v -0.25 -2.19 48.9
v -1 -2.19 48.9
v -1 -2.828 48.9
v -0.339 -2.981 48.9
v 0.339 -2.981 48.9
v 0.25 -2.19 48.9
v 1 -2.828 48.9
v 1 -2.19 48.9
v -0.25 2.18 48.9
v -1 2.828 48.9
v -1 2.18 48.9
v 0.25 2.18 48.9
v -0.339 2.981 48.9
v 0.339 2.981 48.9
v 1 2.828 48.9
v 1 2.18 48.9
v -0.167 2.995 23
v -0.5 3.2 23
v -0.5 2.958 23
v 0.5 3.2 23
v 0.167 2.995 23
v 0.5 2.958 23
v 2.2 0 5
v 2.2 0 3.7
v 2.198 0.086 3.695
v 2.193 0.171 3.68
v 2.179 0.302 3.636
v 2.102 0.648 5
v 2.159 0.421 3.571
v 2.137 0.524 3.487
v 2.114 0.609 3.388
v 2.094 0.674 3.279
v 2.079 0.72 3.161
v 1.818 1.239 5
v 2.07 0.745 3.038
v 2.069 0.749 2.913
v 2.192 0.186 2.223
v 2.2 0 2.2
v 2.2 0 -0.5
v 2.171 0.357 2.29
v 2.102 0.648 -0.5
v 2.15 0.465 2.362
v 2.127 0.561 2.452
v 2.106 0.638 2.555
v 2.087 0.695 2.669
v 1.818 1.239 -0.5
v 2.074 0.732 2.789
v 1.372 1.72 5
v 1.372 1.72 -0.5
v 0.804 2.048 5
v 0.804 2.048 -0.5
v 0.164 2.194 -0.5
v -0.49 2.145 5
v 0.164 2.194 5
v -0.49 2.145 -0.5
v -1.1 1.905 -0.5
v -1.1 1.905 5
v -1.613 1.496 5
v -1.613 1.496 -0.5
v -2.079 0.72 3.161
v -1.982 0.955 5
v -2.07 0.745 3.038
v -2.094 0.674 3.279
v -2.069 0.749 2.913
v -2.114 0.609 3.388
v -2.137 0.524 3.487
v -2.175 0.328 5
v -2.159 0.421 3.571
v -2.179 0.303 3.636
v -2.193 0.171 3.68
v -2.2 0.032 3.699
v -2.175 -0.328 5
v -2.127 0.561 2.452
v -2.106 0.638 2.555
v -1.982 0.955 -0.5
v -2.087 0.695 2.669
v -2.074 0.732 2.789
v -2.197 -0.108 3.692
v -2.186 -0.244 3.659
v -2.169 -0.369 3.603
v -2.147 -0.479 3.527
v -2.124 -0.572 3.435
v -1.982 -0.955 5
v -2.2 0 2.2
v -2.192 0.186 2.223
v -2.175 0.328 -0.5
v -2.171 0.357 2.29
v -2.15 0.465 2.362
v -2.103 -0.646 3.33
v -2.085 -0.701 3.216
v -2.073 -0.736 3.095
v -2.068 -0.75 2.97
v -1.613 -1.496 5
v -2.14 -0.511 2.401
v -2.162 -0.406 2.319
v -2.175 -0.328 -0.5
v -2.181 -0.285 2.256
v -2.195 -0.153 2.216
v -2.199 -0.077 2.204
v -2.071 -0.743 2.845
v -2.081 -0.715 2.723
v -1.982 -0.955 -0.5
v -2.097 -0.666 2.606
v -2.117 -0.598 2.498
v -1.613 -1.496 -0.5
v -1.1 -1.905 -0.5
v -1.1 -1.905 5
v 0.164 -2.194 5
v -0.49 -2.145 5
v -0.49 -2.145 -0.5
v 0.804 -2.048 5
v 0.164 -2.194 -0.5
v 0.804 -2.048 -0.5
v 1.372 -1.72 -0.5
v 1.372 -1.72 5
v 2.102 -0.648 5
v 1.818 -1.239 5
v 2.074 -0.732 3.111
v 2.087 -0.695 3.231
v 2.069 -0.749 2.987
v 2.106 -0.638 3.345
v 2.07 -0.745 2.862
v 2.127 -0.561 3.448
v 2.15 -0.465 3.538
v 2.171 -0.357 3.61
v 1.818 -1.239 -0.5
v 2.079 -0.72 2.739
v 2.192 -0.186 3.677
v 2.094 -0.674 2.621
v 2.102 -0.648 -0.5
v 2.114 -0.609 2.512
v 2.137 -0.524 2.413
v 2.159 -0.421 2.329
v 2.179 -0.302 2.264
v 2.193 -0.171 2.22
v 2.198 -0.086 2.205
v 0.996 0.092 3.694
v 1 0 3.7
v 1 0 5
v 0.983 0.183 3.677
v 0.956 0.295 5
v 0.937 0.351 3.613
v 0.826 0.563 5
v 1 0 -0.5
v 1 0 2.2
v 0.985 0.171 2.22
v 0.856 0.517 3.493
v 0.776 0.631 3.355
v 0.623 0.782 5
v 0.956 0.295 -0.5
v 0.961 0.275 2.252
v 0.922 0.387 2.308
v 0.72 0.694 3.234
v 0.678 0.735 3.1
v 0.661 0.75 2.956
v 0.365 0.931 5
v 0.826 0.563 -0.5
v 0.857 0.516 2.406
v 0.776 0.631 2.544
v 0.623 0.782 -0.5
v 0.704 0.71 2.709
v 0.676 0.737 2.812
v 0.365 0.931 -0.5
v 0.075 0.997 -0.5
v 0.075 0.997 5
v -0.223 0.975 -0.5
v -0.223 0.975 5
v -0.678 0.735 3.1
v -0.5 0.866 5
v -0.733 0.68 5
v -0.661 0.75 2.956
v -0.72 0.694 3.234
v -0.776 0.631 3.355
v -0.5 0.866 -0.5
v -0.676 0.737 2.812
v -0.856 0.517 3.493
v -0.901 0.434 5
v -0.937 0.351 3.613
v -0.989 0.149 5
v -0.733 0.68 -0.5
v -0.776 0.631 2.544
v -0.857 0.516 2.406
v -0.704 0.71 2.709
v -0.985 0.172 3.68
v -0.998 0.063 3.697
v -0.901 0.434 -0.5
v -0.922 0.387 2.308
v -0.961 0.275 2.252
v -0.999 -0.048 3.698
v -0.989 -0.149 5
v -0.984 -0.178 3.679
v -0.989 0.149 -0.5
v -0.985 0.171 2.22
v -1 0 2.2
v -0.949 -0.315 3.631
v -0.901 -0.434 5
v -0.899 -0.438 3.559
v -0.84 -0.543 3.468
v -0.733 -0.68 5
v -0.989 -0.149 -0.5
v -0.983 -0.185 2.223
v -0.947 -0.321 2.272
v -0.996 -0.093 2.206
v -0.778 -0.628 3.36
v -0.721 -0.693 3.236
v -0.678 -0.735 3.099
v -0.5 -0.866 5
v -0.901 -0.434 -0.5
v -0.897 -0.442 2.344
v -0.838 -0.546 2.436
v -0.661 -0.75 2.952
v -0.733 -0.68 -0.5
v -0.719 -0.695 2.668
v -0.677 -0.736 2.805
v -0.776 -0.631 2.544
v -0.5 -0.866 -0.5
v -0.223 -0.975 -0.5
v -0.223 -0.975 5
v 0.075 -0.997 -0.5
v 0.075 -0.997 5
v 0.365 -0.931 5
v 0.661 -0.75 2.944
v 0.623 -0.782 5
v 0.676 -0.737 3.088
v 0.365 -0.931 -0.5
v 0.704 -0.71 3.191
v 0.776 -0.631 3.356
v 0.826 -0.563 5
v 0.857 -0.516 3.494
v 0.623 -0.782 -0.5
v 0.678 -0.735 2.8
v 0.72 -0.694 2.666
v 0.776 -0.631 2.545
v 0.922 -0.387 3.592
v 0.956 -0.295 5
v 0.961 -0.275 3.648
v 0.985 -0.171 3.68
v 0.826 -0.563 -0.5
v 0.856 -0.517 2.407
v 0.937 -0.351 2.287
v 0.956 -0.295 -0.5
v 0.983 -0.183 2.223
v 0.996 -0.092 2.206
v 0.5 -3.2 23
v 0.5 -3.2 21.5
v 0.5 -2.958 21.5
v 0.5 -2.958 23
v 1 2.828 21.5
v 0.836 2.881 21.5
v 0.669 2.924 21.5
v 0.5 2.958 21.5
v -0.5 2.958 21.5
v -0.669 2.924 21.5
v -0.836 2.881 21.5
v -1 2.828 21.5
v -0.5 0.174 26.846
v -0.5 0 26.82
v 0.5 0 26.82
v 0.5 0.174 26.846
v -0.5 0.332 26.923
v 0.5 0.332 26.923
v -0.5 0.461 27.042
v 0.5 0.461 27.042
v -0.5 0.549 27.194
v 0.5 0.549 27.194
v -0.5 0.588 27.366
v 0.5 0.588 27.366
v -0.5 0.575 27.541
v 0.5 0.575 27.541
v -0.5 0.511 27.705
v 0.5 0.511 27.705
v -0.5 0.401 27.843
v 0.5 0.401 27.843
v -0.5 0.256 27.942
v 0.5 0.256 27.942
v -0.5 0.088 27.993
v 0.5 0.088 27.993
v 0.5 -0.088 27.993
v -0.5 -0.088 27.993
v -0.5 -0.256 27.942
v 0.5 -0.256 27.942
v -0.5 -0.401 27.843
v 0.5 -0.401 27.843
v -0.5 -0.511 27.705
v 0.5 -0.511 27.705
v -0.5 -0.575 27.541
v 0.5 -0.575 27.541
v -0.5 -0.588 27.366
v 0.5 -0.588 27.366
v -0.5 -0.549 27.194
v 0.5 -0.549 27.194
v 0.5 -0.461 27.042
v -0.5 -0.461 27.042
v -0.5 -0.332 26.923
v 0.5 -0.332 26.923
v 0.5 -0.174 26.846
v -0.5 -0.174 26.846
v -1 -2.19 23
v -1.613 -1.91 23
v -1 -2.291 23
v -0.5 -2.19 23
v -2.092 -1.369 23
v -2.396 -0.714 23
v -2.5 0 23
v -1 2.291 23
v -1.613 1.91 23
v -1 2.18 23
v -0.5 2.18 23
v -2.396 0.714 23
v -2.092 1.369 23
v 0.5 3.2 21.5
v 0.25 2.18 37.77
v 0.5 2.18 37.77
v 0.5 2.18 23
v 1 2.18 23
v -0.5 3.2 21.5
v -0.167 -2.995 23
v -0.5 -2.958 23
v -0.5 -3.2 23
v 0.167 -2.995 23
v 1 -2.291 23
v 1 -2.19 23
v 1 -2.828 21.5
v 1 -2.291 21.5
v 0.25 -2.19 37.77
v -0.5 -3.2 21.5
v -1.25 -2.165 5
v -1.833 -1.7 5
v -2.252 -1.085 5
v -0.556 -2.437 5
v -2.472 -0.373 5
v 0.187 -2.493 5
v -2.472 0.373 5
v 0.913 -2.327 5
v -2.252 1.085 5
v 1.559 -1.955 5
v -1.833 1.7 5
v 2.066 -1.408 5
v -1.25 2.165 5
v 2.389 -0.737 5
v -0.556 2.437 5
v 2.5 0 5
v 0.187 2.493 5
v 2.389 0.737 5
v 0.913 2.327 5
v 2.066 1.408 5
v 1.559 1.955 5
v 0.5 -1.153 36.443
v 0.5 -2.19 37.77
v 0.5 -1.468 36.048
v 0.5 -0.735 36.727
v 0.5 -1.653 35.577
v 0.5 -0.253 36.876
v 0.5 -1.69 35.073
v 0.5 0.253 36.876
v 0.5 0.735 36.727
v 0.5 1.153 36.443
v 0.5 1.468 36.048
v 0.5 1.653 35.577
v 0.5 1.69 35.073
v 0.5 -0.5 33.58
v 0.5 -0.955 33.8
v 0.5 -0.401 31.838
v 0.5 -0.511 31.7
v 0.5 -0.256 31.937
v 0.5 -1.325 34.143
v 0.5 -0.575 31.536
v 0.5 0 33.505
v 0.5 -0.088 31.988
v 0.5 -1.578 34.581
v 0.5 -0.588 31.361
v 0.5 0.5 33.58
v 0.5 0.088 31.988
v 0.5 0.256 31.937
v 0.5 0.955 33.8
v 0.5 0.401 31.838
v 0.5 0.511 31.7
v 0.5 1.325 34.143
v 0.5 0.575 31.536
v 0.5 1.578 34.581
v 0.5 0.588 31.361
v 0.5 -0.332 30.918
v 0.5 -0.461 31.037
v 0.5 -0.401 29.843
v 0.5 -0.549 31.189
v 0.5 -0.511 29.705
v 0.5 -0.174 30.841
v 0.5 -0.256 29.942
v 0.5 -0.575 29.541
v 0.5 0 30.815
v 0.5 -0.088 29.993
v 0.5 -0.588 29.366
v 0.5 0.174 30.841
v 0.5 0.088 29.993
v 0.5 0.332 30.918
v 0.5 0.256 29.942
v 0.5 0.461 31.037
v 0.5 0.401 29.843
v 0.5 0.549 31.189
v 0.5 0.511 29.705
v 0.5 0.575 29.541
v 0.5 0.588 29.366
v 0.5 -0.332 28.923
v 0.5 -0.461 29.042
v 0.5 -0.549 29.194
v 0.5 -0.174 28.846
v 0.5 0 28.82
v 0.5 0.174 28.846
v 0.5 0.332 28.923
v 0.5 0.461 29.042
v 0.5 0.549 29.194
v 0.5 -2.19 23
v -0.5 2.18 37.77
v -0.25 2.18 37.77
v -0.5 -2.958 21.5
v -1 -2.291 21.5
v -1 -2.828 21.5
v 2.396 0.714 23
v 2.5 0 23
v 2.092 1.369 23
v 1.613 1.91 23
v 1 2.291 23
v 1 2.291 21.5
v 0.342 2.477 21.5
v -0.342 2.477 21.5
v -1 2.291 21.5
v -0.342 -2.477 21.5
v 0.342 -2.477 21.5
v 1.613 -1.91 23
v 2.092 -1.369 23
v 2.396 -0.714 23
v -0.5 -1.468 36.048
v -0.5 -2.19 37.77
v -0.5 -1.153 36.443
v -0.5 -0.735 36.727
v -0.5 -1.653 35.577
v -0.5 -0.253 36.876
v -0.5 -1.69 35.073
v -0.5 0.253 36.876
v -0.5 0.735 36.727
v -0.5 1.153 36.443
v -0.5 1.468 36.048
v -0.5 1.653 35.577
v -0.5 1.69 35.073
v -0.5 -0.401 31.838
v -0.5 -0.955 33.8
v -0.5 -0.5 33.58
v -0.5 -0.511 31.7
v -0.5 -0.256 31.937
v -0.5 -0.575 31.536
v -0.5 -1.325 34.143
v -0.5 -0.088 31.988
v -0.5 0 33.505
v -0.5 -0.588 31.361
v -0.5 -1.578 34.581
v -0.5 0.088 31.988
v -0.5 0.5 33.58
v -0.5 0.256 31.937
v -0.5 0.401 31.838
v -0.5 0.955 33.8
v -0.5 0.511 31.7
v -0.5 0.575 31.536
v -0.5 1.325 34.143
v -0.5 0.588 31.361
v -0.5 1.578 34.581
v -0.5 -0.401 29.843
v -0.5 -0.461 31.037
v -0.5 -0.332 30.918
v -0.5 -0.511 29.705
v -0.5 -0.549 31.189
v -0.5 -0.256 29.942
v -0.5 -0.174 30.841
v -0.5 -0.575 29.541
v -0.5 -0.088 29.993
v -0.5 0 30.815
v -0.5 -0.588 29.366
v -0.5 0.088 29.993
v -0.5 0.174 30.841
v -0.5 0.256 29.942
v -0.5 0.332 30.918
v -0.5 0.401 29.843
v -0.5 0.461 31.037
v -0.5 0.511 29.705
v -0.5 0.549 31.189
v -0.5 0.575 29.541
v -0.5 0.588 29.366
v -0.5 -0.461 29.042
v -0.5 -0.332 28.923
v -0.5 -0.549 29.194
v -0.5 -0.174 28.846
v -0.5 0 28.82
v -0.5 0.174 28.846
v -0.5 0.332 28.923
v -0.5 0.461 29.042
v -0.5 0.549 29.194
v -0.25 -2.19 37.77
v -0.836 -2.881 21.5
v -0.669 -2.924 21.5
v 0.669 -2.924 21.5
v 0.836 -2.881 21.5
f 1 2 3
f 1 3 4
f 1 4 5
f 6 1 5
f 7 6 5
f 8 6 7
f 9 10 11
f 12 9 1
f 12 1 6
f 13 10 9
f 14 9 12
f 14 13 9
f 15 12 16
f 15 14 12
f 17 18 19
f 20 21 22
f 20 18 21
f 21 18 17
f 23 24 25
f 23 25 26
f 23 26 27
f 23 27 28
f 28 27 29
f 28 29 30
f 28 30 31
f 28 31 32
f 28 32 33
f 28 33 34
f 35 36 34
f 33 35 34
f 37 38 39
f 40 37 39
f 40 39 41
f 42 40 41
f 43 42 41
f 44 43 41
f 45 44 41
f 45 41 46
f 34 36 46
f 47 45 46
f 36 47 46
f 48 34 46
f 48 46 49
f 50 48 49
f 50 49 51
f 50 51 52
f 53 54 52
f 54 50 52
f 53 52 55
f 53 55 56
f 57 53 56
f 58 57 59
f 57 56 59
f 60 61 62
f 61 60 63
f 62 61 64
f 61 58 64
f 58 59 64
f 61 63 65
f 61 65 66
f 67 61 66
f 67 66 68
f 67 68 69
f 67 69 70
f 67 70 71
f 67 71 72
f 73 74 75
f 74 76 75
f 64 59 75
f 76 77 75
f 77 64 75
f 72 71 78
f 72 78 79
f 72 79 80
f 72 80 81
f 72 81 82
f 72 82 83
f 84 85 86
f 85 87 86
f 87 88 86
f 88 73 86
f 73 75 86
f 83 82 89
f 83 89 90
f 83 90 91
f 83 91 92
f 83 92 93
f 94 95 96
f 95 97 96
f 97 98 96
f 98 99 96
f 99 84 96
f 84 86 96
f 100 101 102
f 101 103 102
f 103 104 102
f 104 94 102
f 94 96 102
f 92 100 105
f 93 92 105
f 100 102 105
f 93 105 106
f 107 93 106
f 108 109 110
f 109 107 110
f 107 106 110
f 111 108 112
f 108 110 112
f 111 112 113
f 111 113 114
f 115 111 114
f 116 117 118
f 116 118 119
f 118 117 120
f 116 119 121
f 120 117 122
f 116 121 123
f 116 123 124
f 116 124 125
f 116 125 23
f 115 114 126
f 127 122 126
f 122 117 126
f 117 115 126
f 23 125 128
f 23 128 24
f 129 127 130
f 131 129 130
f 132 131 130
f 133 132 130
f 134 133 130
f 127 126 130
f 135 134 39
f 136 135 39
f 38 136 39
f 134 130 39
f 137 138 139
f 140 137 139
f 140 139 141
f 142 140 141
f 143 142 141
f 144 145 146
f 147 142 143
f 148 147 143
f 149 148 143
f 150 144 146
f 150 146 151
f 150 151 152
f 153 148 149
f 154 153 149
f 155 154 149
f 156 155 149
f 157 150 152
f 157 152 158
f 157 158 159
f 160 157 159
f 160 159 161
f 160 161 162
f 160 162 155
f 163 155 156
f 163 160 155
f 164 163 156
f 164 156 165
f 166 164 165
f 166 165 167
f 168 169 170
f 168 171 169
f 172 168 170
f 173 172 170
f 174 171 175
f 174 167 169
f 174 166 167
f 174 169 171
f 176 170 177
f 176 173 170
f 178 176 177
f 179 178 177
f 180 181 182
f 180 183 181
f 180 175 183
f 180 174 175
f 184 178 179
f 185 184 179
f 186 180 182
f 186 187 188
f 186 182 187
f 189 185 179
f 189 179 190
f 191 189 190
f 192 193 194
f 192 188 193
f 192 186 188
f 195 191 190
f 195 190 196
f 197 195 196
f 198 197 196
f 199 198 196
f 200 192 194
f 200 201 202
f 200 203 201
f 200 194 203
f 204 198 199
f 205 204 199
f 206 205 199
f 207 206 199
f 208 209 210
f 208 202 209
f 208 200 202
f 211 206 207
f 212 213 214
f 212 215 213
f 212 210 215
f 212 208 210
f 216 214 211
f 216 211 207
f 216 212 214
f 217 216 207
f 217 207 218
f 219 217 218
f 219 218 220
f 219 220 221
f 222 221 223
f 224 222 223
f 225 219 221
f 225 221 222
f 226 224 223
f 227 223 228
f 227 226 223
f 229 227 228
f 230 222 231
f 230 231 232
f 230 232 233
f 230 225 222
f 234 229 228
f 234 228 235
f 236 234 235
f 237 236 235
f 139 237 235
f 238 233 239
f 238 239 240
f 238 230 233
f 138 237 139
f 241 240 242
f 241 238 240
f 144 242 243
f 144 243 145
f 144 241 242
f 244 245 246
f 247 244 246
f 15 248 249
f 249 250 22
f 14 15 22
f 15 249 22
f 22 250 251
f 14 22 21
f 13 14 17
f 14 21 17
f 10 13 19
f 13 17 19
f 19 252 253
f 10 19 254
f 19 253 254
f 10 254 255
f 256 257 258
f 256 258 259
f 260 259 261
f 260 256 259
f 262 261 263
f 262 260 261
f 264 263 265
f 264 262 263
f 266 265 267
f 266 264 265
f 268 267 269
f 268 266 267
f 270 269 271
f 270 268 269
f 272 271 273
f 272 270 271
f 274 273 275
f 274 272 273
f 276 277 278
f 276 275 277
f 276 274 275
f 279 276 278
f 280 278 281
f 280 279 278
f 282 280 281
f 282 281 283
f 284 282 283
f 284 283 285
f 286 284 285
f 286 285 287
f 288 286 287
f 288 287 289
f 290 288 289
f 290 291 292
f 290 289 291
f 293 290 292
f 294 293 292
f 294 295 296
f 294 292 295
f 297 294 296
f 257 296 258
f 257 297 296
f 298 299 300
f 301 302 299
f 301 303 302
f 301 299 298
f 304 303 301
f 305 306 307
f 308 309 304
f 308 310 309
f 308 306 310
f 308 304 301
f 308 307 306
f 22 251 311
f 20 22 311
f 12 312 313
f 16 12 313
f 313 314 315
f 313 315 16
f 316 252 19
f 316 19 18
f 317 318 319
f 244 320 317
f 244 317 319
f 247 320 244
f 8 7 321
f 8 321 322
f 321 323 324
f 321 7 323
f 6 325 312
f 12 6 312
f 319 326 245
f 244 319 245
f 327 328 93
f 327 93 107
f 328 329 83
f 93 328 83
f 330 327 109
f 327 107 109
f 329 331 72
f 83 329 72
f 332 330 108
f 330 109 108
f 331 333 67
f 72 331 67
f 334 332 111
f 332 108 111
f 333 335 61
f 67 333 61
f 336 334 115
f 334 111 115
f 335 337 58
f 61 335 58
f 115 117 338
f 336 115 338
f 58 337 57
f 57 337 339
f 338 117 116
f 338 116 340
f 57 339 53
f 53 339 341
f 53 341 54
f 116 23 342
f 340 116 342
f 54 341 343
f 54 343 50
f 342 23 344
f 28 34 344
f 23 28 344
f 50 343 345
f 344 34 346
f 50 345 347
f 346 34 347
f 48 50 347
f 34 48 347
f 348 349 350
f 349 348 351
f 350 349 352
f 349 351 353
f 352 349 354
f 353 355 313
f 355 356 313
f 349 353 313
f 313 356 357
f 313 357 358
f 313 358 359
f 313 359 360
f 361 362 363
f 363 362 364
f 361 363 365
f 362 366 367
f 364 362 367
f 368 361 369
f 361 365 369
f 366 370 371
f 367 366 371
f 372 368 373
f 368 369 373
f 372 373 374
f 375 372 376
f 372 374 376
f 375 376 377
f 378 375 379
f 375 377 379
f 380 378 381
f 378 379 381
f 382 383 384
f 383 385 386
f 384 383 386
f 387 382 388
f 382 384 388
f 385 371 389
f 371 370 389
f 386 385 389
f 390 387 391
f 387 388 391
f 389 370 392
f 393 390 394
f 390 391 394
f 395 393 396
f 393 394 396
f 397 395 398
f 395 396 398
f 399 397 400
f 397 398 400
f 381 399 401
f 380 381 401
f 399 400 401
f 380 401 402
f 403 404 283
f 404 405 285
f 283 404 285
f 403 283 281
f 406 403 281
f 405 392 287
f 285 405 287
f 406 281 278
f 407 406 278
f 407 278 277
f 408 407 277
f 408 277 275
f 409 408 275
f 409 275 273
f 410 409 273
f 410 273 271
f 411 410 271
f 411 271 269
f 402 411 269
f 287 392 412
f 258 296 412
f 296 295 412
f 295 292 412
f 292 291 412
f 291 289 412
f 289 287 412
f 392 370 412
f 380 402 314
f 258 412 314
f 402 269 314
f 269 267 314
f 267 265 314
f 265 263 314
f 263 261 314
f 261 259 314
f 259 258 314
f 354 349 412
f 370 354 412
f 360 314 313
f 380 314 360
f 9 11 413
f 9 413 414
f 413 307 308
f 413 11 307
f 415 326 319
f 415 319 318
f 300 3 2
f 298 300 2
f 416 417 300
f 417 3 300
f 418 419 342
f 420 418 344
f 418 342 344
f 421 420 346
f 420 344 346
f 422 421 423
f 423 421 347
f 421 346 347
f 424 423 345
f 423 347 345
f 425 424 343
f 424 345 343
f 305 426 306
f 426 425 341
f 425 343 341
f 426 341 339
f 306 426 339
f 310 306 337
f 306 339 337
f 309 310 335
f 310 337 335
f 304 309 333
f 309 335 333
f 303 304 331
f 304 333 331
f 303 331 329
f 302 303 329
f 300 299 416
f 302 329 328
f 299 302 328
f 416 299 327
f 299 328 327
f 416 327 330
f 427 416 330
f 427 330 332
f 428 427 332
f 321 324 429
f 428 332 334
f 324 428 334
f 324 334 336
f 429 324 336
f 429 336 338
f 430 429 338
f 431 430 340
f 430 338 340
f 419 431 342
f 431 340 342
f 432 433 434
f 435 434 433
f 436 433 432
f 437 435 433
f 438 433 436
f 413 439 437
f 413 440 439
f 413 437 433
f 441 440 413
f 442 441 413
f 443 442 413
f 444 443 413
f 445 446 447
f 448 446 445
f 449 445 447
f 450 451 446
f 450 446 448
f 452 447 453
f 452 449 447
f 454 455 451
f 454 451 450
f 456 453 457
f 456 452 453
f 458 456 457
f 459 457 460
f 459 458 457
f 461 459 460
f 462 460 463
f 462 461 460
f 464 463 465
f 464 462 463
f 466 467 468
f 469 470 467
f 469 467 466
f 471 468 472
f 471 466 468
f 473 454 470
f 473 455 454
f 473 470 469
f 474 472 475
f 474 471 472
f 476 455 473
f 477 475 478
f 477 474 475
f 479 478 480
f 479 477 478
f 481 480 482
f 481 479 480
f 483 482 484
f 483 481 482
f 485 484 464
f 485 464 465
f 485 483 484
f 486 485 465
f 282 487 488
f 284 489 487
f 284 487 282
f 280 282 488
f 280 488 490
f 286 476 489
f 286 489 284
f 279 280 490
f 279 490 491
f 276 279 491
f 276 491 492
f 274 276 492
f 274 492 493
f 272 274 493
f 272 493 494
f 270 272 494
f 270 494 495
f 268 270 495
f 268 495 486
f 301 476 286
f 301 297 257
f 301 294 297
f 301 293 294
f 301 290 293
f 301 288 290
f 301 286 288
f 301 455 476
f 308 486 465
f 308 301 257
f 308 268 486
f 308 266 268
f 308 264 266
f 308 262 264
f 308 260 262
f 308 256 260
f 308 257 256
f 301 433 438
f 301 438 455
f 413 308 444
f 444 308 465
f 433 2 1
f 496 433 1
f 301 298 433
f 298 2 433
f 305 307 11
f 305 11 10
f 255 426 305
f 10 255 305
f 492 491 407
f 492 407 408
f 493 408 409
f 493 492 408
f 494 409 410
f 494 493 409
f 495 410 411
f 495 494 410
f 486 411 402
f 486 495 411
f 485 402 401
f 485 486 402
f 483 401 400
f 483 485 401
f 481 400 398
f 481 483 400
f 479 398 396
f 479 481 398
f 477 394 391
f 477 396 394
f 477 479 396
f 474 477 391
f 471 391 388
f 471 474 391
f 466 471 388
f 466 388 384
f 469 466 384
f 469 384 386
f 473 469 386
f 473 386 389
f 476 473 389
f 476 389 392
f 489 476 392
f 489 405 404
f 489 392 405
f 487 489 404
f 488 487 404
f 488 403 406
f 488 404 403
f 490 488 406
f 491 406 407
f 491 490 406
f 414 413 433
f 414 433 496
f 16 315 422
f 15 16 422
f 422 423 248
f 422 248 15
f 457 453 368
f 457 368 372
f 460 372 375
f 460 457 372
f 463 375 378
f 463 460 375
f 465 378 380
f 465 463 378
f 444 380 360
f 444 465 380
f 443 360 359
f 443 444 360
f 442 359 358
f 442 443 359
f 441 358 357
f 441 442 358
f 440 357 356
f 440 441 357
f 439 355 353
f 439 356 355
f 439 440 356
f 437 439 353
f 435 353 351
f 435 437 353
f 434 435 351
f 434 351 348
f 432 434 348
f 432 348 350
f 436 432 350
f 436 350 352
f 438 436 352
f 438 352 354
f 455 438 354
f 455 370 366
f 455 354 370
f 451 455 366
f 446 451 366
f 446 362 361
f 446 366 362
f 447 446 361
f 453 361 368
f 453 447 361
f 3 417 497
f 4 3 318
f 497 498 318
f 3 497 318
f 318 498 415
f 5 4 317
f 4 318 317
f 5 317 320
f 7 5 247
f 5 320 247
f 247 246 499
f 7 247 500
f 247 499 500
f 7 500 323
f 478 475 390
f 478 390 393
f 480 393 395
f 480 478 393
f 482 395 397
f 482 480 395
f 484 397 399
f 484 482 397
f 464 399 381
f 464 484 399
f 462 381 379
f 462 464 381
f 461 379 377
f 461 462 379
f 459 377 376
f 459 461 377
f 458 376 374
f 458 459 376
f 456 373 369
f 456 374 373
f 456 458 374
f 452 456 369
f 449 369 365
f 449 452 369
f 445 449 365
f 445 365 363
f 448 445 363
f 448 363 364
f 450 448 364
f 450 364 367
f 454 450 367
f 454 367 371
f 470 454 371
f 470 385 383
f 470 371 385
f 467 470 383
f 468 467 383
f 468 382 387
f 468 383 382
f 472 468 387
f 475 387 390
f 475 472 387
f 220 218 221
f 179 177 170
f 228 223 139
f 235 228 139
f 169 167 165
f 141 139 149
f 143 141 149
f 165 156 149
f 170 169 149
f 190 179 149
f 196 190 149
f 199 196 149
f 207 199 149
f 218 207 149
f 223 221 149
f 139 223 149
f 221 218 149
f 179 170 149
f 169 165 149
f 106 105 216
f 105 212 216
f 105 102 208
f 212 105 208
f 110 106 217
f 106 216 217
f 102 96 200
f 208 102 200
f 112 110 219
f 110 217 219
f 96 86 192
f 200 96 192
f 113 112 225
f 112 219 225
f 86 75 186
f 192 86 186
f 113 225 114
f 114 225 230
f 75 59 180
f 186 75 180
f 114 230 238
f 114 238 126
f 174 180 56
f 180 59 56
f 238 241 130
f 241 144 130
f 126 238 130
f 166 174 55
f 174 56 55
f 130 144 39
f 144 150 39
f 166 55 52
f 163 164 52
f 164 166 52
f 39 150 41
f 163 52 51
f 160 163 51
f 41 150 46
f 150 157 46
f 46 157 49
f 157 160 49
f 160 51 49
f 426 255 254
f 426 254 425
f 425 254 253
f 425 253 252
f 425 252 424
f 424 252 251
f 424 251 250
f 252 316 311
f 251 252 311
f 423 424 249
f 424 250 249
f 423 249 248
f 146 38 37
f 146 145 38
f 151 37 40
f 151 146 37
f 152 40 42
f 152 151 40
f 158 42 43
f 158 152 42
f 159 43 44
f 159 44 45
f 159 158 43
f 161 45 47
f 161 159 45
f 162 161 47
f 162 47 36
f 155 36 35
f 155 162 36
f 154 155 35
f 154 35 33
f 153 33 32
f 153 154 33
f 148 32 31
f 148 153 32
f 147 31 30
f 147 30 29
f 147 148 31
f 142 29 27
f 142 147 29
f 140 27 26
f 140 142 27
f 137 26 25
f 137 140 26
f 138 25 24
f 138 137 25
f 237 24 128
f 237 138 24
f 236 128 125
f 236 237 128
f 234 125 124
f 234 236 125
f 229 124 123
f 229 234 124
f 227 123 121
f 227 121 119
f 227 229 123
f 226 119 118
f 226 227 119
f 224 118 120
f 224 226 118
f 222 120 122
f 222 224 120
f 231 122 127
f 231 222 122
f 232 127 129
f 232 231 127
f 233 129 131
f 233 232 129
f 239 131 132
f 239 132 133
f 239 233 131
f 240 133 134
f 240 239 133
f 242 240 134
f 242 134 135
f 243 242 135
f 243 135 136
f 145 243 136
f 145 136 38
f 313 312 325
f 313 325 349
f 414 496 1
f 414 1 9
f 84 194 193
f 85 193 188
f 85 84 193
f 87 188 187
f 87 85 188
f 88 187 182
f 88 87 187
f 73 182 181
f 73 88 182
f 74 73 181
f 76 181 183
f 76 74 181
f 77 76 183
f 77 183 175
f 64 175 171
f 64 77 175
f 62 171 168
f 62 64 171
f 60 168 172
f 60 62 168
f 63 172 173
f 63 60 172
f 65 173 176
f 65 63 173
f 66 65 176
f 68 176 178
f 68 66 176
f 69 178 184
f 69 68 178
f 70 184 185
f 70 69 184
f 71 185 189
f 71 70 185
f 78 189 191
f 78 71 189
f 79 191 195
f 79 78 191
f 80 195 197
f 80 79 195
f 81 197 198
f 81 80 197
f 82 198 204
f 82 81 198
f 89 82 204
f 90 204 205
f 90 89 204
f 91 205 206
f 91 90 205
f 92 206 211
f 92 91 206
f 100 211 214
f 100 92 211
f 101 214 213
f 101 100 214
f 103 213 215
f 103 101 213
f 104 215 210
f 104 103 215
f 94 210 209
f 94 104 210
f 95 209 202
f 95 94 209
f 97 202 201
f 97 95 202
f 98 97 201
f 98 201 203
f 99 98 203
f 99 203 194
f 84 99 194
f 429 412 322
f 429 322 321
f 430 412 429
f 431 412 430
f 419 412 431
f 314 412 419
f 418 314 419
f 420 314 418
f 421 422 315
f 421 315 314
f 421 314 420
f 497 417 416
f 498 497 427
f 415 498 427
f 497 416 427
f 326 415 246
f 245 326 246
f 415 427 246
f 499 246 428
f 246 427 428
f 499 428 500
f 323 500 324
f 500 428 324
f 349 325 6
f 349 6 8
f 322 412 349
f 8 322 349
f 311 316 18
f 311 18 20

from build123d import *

# Parameters (mm, degrees)
BOX002_W          = 1
BOX002_H          = 6.4
BOX002_DEPTH      = 1.5
BOX006_W          = 10
BOX006_H          = 4.37
BOX006_DEPTH      = 12
BOX005_W          = 10
BOX005_H          = 4.37
BOX005_DEPTH      = 12
CYLINDER008_R     = 0.59
CYLINDER008_DEPTH = 50
CYLINDER009_R     = 0.59
CYLINDER009_DEPTH = 50
CYLINDER007_R     = 0.59
CYLINDER007_DEPTH = 50
BOX003_W          = 10
BOX003_H          = 4.37
BOX003_DEPTH      = 26
BOX004_W          = 10
BOX004_H          = 4.37
BOX004_DEPTH      = 26
BOX001_W          = 10
BOX001_H          = 5.5
BOX001_DEPTH      = 27
CYLINDER006_R     = 1.695
CYLINDER006_DEPTH = 20
CYLINDER003_R     = 1.1
CYLINDER003_DEPTH = 2
BOX_W             = 2
BOX_H             = 10
BOX_DEPTH         = 27.9
CYLINDER004_R     = 3
CYLINDER004_DEPTH = 27.4
CYLINDER005_R     = 1
CYLINDER005_DEPTH = 5.5
CYLINDER002_R     = 0.75
CYLINDER002_DEPTH = 6.2
CYLINDER001_R     = 2.5
CYLINDER001_DEPTH = 18
CYLINDER_R        = 2.2
CYLINDER_DEPTH    = 21.5


with BuildPart() as w_rfel002:
    # Box002 → Box002 (new body)
    with BuildSketch(Plane(origin=(-0.5, -3.2, 21.5), x_dir=(1, 0, 0), z_dir=(0, 0, 1))):
        with Locations((0.5, 3.2)):
            Rectangle(BOX002_W, BOX002_H)
    extrude(amount=BOX002_DEPTH)


with BuildPart() as w_rfel006:
    # Box006 → Box006 (new body)
    with BuildSketch(Plane(origin=(-10.25, -2.19, 36.77), x_dir=(1, 0, 0), z_dir=(0, 0, 1))):
        with Locations((5, 2.185)):
            Rectangle(BOX006_W, BOX006_H)
    extrude(amount=BOX006_DEPTH)


with BuildPart() as fusion004:
    # Box005 → Box005 (new body)
    with BuildSketch(Plane(origin=(0.25, -2.19, 36.77), x_dir=(1, 0, 0), z_dir=(0, 0, 1))):
        with Locations((5, 2.185)):
            Rectangle(BOX005_W, BOX005_H)
    extrude(amount=BOX005_DEPTH)

    # Fusion004: union Würfel006
    add(w_rfel006.part)


with BuildPart() as fusion004_1:
    # Fusion004 placement: moved
    add(fusion004.part.moved(Location((0, 0, 1))))


with BuildPart() as m1_6_thread2:
    # Cylinder008 → Cylinder008 (new body)
    with BuildSketch(Plane(origin=(-4, 0, 29.41), x_dir=(0, 0, -1), z_dir=(1, 0, 0))):
        Circle(CYLINDER008_R)
    extrude(amount=CYLINDER008_DEPTH)


with BuildPart() as m1_6_thread3:
    # Cylinder009 → Cylinder009 (new body)
    with BuildSketch(Plane(origin=(-4, 0, 27.41), x_dir=(0, 0, -1), z_dir=(1, 0, 0))):
        Circle(CYLINDER009_R)
    extrude(amount=CYLINDER009_DEPTH)


with BuildPart() as mirrormountingholes:
    # Cylinder007 → Cylinder007 (new body)
    with BuildSketch(Plane(origin=(-4, 0, 31.405), x_dir=(0, 0, -1), z_dir=(1, 0, 0))):
        Circle(CYLINDER007_R)
    extrude(amount=CYLINDER007_DEPTH)

    # Fusion003: union M1_6__Thread2, M1_6__Thread3
    add(m1_6_thread2.part)
    add(m1_6_thread3.part)


with BuildPart() as w_rfel003:
    # Box003 → Box003 (new body)
    with BuildSketch(Plane(origin=(0.5, -2.19, 23), x_dir=(1, 0, 0), z_dir=(0, 0, 1))):
        with Locations((5, 2.185)):
            Rectangle(BOX003_W, BOX003_H)
    extrude(amount=BOX003_DEPTH)


with BuildPart() as mirrorgrooves:
    # Box004 → Box004 (new body)
    with BuildSketch(Plane(origin=(-10.5, -2.19, 23), x_dir=(1, 0, 0), z_dir=(0, 0, 1))):
        with Locations((5, 2.185)):
            Rectangle(BOX004_W, BOX004_H)
    extrude(amount=BOX004_DEPTH)

    # Fusion002: union Würfel003
    add(w_rfel003.part)


with BuildPart() as w_rfel001:
    # Box001 → Box001 (new body)
    with BuildSketch(Plane(origin=(1, -2.57, 21), x_dir=(1, 0, 0), z_dir=(0, 0, 1))):
        with Locations((5, 2.75)):
            Rectangle(BOX001_W, BOX001_H)
    extrude(amount=BOX001_DEPTH)


with BuildPart() as probehole:
    # Cylinder006 → Cylinder006 (new body)
    with BuildSketch(Plane(origin=(-4, 0, 35.2), x_dir=(0, 0, -1), z_dir=(1, 0, 0))):
        Circle(CYLINDER006_R)
    extrude(amount=CYLINDER006_DEPTH)


with BuildPart() as beamhole:
    # Cylinder003 → Cylinder003 (new body)
    with BuildSketch(Plane(origin=(-1, 0, 35.2), x_dir=(0, 0, -1), z_dir=(1, 0, 0))):
        Circle(CYLINDER003_R)
    extrude(amount=CYLINDER003_DEPTH)


with BuildPart() as w_rfel:
    # Box → Box (new body)
    with BuildSketch(Plane(origin=(-1, -5, 21), x_dir=(1, 0, 0), z_dir=(0, 0, 1))):
        with Locations((1, 5)):
            Rectangle(BOX_W, BOX_H)
    extrude(amount=BOX_DEPTH)


with BuildPart() as cut004:
    # Cylinder004 → Cylinder004 (new body)
    with BuildSketch(Plane.XY.offset(21.5)):
        Circle(CYLINDER004_R)
    extrude(amount=CYLINDER004_DEPTH)

    # Common: intersect Würfel
    add(w_rfel.part, mode=Mode.INTERSECT)

    # Cut001: cut BeamHole
    add(beamhole.part, mode=Mode.SUBTRACT)

    # Cut003: cut ProbeHole
    add(probehole.part, mode=Mode.SUBTRACT)

    # Cut004: cut Würfel001
    add(w_rfel001.part, mode=Mode.SUBTRACT)


with BuildPart() as zylinder005:
    # Cylinder005 → Cylinder005 (new body)
    with BuildSketch(Plane.XY.offset(-0.5)):
        Circle(CYLINDER005_R)
    extrude(amount=CYLINDER005_DEPTH)


with BuildPart() as zylinder002:
    # Cylinder002 → Cylinder002 (new body)
    with BuildSketch(Plane(origin=(-3.25, 0, 2.95), x_dir=(0, 0, -1), z_dir=(1, 0, 0))):
        Circle(CYLINDER002_R)
    extrude(amount=CYLINDER002_DEPTH)


with BuildPart() as zylinder001:
    # Cylinder001 → Cylinder001 (new body)
    with BuildSketch(Plane.XY.offset(5)):
        Circle(CYLINDER001_R)
    extrude(amount=CYLINDER001_DEPTH)


with BuildPart() as fusion005:
    # Cylinder → Cylinder (new body)
    with BuildSketch(Plane.XY.offset(-0.5)):
        Circle(CYLINDER_R)
    extrude(amount=CYLINDER_DEPTH)

    # Fusion: union Zylinder001
    add(zylinder001.part)

    # Cut: cut Zylinder002
    add(zylinder002.part, mode=Mode.SUBTRACT)

    # Cut002: cut Zylinder005
    add(zylinder005.part, mode=Mode.SUBTRACT)

    # Fusion001: union Cut004
    add(cut004.part)

    # Cut005: cut MirrorGrooves
    add(mirrorgrooves.part, mode=Mode.SUBTRACT)

    # Cut006: cut MirrorMountingHoles
    add(mirrormountingholes.part, mode=Mode.SUBTRACT)

    # Cut007: cut Fusion004
    add(fusion004_1.part, mode=Mode.SUBTRACT)

    # Fusion005: union Würfel002
    add(w_rfel002.part)


solid = fusion005.part
